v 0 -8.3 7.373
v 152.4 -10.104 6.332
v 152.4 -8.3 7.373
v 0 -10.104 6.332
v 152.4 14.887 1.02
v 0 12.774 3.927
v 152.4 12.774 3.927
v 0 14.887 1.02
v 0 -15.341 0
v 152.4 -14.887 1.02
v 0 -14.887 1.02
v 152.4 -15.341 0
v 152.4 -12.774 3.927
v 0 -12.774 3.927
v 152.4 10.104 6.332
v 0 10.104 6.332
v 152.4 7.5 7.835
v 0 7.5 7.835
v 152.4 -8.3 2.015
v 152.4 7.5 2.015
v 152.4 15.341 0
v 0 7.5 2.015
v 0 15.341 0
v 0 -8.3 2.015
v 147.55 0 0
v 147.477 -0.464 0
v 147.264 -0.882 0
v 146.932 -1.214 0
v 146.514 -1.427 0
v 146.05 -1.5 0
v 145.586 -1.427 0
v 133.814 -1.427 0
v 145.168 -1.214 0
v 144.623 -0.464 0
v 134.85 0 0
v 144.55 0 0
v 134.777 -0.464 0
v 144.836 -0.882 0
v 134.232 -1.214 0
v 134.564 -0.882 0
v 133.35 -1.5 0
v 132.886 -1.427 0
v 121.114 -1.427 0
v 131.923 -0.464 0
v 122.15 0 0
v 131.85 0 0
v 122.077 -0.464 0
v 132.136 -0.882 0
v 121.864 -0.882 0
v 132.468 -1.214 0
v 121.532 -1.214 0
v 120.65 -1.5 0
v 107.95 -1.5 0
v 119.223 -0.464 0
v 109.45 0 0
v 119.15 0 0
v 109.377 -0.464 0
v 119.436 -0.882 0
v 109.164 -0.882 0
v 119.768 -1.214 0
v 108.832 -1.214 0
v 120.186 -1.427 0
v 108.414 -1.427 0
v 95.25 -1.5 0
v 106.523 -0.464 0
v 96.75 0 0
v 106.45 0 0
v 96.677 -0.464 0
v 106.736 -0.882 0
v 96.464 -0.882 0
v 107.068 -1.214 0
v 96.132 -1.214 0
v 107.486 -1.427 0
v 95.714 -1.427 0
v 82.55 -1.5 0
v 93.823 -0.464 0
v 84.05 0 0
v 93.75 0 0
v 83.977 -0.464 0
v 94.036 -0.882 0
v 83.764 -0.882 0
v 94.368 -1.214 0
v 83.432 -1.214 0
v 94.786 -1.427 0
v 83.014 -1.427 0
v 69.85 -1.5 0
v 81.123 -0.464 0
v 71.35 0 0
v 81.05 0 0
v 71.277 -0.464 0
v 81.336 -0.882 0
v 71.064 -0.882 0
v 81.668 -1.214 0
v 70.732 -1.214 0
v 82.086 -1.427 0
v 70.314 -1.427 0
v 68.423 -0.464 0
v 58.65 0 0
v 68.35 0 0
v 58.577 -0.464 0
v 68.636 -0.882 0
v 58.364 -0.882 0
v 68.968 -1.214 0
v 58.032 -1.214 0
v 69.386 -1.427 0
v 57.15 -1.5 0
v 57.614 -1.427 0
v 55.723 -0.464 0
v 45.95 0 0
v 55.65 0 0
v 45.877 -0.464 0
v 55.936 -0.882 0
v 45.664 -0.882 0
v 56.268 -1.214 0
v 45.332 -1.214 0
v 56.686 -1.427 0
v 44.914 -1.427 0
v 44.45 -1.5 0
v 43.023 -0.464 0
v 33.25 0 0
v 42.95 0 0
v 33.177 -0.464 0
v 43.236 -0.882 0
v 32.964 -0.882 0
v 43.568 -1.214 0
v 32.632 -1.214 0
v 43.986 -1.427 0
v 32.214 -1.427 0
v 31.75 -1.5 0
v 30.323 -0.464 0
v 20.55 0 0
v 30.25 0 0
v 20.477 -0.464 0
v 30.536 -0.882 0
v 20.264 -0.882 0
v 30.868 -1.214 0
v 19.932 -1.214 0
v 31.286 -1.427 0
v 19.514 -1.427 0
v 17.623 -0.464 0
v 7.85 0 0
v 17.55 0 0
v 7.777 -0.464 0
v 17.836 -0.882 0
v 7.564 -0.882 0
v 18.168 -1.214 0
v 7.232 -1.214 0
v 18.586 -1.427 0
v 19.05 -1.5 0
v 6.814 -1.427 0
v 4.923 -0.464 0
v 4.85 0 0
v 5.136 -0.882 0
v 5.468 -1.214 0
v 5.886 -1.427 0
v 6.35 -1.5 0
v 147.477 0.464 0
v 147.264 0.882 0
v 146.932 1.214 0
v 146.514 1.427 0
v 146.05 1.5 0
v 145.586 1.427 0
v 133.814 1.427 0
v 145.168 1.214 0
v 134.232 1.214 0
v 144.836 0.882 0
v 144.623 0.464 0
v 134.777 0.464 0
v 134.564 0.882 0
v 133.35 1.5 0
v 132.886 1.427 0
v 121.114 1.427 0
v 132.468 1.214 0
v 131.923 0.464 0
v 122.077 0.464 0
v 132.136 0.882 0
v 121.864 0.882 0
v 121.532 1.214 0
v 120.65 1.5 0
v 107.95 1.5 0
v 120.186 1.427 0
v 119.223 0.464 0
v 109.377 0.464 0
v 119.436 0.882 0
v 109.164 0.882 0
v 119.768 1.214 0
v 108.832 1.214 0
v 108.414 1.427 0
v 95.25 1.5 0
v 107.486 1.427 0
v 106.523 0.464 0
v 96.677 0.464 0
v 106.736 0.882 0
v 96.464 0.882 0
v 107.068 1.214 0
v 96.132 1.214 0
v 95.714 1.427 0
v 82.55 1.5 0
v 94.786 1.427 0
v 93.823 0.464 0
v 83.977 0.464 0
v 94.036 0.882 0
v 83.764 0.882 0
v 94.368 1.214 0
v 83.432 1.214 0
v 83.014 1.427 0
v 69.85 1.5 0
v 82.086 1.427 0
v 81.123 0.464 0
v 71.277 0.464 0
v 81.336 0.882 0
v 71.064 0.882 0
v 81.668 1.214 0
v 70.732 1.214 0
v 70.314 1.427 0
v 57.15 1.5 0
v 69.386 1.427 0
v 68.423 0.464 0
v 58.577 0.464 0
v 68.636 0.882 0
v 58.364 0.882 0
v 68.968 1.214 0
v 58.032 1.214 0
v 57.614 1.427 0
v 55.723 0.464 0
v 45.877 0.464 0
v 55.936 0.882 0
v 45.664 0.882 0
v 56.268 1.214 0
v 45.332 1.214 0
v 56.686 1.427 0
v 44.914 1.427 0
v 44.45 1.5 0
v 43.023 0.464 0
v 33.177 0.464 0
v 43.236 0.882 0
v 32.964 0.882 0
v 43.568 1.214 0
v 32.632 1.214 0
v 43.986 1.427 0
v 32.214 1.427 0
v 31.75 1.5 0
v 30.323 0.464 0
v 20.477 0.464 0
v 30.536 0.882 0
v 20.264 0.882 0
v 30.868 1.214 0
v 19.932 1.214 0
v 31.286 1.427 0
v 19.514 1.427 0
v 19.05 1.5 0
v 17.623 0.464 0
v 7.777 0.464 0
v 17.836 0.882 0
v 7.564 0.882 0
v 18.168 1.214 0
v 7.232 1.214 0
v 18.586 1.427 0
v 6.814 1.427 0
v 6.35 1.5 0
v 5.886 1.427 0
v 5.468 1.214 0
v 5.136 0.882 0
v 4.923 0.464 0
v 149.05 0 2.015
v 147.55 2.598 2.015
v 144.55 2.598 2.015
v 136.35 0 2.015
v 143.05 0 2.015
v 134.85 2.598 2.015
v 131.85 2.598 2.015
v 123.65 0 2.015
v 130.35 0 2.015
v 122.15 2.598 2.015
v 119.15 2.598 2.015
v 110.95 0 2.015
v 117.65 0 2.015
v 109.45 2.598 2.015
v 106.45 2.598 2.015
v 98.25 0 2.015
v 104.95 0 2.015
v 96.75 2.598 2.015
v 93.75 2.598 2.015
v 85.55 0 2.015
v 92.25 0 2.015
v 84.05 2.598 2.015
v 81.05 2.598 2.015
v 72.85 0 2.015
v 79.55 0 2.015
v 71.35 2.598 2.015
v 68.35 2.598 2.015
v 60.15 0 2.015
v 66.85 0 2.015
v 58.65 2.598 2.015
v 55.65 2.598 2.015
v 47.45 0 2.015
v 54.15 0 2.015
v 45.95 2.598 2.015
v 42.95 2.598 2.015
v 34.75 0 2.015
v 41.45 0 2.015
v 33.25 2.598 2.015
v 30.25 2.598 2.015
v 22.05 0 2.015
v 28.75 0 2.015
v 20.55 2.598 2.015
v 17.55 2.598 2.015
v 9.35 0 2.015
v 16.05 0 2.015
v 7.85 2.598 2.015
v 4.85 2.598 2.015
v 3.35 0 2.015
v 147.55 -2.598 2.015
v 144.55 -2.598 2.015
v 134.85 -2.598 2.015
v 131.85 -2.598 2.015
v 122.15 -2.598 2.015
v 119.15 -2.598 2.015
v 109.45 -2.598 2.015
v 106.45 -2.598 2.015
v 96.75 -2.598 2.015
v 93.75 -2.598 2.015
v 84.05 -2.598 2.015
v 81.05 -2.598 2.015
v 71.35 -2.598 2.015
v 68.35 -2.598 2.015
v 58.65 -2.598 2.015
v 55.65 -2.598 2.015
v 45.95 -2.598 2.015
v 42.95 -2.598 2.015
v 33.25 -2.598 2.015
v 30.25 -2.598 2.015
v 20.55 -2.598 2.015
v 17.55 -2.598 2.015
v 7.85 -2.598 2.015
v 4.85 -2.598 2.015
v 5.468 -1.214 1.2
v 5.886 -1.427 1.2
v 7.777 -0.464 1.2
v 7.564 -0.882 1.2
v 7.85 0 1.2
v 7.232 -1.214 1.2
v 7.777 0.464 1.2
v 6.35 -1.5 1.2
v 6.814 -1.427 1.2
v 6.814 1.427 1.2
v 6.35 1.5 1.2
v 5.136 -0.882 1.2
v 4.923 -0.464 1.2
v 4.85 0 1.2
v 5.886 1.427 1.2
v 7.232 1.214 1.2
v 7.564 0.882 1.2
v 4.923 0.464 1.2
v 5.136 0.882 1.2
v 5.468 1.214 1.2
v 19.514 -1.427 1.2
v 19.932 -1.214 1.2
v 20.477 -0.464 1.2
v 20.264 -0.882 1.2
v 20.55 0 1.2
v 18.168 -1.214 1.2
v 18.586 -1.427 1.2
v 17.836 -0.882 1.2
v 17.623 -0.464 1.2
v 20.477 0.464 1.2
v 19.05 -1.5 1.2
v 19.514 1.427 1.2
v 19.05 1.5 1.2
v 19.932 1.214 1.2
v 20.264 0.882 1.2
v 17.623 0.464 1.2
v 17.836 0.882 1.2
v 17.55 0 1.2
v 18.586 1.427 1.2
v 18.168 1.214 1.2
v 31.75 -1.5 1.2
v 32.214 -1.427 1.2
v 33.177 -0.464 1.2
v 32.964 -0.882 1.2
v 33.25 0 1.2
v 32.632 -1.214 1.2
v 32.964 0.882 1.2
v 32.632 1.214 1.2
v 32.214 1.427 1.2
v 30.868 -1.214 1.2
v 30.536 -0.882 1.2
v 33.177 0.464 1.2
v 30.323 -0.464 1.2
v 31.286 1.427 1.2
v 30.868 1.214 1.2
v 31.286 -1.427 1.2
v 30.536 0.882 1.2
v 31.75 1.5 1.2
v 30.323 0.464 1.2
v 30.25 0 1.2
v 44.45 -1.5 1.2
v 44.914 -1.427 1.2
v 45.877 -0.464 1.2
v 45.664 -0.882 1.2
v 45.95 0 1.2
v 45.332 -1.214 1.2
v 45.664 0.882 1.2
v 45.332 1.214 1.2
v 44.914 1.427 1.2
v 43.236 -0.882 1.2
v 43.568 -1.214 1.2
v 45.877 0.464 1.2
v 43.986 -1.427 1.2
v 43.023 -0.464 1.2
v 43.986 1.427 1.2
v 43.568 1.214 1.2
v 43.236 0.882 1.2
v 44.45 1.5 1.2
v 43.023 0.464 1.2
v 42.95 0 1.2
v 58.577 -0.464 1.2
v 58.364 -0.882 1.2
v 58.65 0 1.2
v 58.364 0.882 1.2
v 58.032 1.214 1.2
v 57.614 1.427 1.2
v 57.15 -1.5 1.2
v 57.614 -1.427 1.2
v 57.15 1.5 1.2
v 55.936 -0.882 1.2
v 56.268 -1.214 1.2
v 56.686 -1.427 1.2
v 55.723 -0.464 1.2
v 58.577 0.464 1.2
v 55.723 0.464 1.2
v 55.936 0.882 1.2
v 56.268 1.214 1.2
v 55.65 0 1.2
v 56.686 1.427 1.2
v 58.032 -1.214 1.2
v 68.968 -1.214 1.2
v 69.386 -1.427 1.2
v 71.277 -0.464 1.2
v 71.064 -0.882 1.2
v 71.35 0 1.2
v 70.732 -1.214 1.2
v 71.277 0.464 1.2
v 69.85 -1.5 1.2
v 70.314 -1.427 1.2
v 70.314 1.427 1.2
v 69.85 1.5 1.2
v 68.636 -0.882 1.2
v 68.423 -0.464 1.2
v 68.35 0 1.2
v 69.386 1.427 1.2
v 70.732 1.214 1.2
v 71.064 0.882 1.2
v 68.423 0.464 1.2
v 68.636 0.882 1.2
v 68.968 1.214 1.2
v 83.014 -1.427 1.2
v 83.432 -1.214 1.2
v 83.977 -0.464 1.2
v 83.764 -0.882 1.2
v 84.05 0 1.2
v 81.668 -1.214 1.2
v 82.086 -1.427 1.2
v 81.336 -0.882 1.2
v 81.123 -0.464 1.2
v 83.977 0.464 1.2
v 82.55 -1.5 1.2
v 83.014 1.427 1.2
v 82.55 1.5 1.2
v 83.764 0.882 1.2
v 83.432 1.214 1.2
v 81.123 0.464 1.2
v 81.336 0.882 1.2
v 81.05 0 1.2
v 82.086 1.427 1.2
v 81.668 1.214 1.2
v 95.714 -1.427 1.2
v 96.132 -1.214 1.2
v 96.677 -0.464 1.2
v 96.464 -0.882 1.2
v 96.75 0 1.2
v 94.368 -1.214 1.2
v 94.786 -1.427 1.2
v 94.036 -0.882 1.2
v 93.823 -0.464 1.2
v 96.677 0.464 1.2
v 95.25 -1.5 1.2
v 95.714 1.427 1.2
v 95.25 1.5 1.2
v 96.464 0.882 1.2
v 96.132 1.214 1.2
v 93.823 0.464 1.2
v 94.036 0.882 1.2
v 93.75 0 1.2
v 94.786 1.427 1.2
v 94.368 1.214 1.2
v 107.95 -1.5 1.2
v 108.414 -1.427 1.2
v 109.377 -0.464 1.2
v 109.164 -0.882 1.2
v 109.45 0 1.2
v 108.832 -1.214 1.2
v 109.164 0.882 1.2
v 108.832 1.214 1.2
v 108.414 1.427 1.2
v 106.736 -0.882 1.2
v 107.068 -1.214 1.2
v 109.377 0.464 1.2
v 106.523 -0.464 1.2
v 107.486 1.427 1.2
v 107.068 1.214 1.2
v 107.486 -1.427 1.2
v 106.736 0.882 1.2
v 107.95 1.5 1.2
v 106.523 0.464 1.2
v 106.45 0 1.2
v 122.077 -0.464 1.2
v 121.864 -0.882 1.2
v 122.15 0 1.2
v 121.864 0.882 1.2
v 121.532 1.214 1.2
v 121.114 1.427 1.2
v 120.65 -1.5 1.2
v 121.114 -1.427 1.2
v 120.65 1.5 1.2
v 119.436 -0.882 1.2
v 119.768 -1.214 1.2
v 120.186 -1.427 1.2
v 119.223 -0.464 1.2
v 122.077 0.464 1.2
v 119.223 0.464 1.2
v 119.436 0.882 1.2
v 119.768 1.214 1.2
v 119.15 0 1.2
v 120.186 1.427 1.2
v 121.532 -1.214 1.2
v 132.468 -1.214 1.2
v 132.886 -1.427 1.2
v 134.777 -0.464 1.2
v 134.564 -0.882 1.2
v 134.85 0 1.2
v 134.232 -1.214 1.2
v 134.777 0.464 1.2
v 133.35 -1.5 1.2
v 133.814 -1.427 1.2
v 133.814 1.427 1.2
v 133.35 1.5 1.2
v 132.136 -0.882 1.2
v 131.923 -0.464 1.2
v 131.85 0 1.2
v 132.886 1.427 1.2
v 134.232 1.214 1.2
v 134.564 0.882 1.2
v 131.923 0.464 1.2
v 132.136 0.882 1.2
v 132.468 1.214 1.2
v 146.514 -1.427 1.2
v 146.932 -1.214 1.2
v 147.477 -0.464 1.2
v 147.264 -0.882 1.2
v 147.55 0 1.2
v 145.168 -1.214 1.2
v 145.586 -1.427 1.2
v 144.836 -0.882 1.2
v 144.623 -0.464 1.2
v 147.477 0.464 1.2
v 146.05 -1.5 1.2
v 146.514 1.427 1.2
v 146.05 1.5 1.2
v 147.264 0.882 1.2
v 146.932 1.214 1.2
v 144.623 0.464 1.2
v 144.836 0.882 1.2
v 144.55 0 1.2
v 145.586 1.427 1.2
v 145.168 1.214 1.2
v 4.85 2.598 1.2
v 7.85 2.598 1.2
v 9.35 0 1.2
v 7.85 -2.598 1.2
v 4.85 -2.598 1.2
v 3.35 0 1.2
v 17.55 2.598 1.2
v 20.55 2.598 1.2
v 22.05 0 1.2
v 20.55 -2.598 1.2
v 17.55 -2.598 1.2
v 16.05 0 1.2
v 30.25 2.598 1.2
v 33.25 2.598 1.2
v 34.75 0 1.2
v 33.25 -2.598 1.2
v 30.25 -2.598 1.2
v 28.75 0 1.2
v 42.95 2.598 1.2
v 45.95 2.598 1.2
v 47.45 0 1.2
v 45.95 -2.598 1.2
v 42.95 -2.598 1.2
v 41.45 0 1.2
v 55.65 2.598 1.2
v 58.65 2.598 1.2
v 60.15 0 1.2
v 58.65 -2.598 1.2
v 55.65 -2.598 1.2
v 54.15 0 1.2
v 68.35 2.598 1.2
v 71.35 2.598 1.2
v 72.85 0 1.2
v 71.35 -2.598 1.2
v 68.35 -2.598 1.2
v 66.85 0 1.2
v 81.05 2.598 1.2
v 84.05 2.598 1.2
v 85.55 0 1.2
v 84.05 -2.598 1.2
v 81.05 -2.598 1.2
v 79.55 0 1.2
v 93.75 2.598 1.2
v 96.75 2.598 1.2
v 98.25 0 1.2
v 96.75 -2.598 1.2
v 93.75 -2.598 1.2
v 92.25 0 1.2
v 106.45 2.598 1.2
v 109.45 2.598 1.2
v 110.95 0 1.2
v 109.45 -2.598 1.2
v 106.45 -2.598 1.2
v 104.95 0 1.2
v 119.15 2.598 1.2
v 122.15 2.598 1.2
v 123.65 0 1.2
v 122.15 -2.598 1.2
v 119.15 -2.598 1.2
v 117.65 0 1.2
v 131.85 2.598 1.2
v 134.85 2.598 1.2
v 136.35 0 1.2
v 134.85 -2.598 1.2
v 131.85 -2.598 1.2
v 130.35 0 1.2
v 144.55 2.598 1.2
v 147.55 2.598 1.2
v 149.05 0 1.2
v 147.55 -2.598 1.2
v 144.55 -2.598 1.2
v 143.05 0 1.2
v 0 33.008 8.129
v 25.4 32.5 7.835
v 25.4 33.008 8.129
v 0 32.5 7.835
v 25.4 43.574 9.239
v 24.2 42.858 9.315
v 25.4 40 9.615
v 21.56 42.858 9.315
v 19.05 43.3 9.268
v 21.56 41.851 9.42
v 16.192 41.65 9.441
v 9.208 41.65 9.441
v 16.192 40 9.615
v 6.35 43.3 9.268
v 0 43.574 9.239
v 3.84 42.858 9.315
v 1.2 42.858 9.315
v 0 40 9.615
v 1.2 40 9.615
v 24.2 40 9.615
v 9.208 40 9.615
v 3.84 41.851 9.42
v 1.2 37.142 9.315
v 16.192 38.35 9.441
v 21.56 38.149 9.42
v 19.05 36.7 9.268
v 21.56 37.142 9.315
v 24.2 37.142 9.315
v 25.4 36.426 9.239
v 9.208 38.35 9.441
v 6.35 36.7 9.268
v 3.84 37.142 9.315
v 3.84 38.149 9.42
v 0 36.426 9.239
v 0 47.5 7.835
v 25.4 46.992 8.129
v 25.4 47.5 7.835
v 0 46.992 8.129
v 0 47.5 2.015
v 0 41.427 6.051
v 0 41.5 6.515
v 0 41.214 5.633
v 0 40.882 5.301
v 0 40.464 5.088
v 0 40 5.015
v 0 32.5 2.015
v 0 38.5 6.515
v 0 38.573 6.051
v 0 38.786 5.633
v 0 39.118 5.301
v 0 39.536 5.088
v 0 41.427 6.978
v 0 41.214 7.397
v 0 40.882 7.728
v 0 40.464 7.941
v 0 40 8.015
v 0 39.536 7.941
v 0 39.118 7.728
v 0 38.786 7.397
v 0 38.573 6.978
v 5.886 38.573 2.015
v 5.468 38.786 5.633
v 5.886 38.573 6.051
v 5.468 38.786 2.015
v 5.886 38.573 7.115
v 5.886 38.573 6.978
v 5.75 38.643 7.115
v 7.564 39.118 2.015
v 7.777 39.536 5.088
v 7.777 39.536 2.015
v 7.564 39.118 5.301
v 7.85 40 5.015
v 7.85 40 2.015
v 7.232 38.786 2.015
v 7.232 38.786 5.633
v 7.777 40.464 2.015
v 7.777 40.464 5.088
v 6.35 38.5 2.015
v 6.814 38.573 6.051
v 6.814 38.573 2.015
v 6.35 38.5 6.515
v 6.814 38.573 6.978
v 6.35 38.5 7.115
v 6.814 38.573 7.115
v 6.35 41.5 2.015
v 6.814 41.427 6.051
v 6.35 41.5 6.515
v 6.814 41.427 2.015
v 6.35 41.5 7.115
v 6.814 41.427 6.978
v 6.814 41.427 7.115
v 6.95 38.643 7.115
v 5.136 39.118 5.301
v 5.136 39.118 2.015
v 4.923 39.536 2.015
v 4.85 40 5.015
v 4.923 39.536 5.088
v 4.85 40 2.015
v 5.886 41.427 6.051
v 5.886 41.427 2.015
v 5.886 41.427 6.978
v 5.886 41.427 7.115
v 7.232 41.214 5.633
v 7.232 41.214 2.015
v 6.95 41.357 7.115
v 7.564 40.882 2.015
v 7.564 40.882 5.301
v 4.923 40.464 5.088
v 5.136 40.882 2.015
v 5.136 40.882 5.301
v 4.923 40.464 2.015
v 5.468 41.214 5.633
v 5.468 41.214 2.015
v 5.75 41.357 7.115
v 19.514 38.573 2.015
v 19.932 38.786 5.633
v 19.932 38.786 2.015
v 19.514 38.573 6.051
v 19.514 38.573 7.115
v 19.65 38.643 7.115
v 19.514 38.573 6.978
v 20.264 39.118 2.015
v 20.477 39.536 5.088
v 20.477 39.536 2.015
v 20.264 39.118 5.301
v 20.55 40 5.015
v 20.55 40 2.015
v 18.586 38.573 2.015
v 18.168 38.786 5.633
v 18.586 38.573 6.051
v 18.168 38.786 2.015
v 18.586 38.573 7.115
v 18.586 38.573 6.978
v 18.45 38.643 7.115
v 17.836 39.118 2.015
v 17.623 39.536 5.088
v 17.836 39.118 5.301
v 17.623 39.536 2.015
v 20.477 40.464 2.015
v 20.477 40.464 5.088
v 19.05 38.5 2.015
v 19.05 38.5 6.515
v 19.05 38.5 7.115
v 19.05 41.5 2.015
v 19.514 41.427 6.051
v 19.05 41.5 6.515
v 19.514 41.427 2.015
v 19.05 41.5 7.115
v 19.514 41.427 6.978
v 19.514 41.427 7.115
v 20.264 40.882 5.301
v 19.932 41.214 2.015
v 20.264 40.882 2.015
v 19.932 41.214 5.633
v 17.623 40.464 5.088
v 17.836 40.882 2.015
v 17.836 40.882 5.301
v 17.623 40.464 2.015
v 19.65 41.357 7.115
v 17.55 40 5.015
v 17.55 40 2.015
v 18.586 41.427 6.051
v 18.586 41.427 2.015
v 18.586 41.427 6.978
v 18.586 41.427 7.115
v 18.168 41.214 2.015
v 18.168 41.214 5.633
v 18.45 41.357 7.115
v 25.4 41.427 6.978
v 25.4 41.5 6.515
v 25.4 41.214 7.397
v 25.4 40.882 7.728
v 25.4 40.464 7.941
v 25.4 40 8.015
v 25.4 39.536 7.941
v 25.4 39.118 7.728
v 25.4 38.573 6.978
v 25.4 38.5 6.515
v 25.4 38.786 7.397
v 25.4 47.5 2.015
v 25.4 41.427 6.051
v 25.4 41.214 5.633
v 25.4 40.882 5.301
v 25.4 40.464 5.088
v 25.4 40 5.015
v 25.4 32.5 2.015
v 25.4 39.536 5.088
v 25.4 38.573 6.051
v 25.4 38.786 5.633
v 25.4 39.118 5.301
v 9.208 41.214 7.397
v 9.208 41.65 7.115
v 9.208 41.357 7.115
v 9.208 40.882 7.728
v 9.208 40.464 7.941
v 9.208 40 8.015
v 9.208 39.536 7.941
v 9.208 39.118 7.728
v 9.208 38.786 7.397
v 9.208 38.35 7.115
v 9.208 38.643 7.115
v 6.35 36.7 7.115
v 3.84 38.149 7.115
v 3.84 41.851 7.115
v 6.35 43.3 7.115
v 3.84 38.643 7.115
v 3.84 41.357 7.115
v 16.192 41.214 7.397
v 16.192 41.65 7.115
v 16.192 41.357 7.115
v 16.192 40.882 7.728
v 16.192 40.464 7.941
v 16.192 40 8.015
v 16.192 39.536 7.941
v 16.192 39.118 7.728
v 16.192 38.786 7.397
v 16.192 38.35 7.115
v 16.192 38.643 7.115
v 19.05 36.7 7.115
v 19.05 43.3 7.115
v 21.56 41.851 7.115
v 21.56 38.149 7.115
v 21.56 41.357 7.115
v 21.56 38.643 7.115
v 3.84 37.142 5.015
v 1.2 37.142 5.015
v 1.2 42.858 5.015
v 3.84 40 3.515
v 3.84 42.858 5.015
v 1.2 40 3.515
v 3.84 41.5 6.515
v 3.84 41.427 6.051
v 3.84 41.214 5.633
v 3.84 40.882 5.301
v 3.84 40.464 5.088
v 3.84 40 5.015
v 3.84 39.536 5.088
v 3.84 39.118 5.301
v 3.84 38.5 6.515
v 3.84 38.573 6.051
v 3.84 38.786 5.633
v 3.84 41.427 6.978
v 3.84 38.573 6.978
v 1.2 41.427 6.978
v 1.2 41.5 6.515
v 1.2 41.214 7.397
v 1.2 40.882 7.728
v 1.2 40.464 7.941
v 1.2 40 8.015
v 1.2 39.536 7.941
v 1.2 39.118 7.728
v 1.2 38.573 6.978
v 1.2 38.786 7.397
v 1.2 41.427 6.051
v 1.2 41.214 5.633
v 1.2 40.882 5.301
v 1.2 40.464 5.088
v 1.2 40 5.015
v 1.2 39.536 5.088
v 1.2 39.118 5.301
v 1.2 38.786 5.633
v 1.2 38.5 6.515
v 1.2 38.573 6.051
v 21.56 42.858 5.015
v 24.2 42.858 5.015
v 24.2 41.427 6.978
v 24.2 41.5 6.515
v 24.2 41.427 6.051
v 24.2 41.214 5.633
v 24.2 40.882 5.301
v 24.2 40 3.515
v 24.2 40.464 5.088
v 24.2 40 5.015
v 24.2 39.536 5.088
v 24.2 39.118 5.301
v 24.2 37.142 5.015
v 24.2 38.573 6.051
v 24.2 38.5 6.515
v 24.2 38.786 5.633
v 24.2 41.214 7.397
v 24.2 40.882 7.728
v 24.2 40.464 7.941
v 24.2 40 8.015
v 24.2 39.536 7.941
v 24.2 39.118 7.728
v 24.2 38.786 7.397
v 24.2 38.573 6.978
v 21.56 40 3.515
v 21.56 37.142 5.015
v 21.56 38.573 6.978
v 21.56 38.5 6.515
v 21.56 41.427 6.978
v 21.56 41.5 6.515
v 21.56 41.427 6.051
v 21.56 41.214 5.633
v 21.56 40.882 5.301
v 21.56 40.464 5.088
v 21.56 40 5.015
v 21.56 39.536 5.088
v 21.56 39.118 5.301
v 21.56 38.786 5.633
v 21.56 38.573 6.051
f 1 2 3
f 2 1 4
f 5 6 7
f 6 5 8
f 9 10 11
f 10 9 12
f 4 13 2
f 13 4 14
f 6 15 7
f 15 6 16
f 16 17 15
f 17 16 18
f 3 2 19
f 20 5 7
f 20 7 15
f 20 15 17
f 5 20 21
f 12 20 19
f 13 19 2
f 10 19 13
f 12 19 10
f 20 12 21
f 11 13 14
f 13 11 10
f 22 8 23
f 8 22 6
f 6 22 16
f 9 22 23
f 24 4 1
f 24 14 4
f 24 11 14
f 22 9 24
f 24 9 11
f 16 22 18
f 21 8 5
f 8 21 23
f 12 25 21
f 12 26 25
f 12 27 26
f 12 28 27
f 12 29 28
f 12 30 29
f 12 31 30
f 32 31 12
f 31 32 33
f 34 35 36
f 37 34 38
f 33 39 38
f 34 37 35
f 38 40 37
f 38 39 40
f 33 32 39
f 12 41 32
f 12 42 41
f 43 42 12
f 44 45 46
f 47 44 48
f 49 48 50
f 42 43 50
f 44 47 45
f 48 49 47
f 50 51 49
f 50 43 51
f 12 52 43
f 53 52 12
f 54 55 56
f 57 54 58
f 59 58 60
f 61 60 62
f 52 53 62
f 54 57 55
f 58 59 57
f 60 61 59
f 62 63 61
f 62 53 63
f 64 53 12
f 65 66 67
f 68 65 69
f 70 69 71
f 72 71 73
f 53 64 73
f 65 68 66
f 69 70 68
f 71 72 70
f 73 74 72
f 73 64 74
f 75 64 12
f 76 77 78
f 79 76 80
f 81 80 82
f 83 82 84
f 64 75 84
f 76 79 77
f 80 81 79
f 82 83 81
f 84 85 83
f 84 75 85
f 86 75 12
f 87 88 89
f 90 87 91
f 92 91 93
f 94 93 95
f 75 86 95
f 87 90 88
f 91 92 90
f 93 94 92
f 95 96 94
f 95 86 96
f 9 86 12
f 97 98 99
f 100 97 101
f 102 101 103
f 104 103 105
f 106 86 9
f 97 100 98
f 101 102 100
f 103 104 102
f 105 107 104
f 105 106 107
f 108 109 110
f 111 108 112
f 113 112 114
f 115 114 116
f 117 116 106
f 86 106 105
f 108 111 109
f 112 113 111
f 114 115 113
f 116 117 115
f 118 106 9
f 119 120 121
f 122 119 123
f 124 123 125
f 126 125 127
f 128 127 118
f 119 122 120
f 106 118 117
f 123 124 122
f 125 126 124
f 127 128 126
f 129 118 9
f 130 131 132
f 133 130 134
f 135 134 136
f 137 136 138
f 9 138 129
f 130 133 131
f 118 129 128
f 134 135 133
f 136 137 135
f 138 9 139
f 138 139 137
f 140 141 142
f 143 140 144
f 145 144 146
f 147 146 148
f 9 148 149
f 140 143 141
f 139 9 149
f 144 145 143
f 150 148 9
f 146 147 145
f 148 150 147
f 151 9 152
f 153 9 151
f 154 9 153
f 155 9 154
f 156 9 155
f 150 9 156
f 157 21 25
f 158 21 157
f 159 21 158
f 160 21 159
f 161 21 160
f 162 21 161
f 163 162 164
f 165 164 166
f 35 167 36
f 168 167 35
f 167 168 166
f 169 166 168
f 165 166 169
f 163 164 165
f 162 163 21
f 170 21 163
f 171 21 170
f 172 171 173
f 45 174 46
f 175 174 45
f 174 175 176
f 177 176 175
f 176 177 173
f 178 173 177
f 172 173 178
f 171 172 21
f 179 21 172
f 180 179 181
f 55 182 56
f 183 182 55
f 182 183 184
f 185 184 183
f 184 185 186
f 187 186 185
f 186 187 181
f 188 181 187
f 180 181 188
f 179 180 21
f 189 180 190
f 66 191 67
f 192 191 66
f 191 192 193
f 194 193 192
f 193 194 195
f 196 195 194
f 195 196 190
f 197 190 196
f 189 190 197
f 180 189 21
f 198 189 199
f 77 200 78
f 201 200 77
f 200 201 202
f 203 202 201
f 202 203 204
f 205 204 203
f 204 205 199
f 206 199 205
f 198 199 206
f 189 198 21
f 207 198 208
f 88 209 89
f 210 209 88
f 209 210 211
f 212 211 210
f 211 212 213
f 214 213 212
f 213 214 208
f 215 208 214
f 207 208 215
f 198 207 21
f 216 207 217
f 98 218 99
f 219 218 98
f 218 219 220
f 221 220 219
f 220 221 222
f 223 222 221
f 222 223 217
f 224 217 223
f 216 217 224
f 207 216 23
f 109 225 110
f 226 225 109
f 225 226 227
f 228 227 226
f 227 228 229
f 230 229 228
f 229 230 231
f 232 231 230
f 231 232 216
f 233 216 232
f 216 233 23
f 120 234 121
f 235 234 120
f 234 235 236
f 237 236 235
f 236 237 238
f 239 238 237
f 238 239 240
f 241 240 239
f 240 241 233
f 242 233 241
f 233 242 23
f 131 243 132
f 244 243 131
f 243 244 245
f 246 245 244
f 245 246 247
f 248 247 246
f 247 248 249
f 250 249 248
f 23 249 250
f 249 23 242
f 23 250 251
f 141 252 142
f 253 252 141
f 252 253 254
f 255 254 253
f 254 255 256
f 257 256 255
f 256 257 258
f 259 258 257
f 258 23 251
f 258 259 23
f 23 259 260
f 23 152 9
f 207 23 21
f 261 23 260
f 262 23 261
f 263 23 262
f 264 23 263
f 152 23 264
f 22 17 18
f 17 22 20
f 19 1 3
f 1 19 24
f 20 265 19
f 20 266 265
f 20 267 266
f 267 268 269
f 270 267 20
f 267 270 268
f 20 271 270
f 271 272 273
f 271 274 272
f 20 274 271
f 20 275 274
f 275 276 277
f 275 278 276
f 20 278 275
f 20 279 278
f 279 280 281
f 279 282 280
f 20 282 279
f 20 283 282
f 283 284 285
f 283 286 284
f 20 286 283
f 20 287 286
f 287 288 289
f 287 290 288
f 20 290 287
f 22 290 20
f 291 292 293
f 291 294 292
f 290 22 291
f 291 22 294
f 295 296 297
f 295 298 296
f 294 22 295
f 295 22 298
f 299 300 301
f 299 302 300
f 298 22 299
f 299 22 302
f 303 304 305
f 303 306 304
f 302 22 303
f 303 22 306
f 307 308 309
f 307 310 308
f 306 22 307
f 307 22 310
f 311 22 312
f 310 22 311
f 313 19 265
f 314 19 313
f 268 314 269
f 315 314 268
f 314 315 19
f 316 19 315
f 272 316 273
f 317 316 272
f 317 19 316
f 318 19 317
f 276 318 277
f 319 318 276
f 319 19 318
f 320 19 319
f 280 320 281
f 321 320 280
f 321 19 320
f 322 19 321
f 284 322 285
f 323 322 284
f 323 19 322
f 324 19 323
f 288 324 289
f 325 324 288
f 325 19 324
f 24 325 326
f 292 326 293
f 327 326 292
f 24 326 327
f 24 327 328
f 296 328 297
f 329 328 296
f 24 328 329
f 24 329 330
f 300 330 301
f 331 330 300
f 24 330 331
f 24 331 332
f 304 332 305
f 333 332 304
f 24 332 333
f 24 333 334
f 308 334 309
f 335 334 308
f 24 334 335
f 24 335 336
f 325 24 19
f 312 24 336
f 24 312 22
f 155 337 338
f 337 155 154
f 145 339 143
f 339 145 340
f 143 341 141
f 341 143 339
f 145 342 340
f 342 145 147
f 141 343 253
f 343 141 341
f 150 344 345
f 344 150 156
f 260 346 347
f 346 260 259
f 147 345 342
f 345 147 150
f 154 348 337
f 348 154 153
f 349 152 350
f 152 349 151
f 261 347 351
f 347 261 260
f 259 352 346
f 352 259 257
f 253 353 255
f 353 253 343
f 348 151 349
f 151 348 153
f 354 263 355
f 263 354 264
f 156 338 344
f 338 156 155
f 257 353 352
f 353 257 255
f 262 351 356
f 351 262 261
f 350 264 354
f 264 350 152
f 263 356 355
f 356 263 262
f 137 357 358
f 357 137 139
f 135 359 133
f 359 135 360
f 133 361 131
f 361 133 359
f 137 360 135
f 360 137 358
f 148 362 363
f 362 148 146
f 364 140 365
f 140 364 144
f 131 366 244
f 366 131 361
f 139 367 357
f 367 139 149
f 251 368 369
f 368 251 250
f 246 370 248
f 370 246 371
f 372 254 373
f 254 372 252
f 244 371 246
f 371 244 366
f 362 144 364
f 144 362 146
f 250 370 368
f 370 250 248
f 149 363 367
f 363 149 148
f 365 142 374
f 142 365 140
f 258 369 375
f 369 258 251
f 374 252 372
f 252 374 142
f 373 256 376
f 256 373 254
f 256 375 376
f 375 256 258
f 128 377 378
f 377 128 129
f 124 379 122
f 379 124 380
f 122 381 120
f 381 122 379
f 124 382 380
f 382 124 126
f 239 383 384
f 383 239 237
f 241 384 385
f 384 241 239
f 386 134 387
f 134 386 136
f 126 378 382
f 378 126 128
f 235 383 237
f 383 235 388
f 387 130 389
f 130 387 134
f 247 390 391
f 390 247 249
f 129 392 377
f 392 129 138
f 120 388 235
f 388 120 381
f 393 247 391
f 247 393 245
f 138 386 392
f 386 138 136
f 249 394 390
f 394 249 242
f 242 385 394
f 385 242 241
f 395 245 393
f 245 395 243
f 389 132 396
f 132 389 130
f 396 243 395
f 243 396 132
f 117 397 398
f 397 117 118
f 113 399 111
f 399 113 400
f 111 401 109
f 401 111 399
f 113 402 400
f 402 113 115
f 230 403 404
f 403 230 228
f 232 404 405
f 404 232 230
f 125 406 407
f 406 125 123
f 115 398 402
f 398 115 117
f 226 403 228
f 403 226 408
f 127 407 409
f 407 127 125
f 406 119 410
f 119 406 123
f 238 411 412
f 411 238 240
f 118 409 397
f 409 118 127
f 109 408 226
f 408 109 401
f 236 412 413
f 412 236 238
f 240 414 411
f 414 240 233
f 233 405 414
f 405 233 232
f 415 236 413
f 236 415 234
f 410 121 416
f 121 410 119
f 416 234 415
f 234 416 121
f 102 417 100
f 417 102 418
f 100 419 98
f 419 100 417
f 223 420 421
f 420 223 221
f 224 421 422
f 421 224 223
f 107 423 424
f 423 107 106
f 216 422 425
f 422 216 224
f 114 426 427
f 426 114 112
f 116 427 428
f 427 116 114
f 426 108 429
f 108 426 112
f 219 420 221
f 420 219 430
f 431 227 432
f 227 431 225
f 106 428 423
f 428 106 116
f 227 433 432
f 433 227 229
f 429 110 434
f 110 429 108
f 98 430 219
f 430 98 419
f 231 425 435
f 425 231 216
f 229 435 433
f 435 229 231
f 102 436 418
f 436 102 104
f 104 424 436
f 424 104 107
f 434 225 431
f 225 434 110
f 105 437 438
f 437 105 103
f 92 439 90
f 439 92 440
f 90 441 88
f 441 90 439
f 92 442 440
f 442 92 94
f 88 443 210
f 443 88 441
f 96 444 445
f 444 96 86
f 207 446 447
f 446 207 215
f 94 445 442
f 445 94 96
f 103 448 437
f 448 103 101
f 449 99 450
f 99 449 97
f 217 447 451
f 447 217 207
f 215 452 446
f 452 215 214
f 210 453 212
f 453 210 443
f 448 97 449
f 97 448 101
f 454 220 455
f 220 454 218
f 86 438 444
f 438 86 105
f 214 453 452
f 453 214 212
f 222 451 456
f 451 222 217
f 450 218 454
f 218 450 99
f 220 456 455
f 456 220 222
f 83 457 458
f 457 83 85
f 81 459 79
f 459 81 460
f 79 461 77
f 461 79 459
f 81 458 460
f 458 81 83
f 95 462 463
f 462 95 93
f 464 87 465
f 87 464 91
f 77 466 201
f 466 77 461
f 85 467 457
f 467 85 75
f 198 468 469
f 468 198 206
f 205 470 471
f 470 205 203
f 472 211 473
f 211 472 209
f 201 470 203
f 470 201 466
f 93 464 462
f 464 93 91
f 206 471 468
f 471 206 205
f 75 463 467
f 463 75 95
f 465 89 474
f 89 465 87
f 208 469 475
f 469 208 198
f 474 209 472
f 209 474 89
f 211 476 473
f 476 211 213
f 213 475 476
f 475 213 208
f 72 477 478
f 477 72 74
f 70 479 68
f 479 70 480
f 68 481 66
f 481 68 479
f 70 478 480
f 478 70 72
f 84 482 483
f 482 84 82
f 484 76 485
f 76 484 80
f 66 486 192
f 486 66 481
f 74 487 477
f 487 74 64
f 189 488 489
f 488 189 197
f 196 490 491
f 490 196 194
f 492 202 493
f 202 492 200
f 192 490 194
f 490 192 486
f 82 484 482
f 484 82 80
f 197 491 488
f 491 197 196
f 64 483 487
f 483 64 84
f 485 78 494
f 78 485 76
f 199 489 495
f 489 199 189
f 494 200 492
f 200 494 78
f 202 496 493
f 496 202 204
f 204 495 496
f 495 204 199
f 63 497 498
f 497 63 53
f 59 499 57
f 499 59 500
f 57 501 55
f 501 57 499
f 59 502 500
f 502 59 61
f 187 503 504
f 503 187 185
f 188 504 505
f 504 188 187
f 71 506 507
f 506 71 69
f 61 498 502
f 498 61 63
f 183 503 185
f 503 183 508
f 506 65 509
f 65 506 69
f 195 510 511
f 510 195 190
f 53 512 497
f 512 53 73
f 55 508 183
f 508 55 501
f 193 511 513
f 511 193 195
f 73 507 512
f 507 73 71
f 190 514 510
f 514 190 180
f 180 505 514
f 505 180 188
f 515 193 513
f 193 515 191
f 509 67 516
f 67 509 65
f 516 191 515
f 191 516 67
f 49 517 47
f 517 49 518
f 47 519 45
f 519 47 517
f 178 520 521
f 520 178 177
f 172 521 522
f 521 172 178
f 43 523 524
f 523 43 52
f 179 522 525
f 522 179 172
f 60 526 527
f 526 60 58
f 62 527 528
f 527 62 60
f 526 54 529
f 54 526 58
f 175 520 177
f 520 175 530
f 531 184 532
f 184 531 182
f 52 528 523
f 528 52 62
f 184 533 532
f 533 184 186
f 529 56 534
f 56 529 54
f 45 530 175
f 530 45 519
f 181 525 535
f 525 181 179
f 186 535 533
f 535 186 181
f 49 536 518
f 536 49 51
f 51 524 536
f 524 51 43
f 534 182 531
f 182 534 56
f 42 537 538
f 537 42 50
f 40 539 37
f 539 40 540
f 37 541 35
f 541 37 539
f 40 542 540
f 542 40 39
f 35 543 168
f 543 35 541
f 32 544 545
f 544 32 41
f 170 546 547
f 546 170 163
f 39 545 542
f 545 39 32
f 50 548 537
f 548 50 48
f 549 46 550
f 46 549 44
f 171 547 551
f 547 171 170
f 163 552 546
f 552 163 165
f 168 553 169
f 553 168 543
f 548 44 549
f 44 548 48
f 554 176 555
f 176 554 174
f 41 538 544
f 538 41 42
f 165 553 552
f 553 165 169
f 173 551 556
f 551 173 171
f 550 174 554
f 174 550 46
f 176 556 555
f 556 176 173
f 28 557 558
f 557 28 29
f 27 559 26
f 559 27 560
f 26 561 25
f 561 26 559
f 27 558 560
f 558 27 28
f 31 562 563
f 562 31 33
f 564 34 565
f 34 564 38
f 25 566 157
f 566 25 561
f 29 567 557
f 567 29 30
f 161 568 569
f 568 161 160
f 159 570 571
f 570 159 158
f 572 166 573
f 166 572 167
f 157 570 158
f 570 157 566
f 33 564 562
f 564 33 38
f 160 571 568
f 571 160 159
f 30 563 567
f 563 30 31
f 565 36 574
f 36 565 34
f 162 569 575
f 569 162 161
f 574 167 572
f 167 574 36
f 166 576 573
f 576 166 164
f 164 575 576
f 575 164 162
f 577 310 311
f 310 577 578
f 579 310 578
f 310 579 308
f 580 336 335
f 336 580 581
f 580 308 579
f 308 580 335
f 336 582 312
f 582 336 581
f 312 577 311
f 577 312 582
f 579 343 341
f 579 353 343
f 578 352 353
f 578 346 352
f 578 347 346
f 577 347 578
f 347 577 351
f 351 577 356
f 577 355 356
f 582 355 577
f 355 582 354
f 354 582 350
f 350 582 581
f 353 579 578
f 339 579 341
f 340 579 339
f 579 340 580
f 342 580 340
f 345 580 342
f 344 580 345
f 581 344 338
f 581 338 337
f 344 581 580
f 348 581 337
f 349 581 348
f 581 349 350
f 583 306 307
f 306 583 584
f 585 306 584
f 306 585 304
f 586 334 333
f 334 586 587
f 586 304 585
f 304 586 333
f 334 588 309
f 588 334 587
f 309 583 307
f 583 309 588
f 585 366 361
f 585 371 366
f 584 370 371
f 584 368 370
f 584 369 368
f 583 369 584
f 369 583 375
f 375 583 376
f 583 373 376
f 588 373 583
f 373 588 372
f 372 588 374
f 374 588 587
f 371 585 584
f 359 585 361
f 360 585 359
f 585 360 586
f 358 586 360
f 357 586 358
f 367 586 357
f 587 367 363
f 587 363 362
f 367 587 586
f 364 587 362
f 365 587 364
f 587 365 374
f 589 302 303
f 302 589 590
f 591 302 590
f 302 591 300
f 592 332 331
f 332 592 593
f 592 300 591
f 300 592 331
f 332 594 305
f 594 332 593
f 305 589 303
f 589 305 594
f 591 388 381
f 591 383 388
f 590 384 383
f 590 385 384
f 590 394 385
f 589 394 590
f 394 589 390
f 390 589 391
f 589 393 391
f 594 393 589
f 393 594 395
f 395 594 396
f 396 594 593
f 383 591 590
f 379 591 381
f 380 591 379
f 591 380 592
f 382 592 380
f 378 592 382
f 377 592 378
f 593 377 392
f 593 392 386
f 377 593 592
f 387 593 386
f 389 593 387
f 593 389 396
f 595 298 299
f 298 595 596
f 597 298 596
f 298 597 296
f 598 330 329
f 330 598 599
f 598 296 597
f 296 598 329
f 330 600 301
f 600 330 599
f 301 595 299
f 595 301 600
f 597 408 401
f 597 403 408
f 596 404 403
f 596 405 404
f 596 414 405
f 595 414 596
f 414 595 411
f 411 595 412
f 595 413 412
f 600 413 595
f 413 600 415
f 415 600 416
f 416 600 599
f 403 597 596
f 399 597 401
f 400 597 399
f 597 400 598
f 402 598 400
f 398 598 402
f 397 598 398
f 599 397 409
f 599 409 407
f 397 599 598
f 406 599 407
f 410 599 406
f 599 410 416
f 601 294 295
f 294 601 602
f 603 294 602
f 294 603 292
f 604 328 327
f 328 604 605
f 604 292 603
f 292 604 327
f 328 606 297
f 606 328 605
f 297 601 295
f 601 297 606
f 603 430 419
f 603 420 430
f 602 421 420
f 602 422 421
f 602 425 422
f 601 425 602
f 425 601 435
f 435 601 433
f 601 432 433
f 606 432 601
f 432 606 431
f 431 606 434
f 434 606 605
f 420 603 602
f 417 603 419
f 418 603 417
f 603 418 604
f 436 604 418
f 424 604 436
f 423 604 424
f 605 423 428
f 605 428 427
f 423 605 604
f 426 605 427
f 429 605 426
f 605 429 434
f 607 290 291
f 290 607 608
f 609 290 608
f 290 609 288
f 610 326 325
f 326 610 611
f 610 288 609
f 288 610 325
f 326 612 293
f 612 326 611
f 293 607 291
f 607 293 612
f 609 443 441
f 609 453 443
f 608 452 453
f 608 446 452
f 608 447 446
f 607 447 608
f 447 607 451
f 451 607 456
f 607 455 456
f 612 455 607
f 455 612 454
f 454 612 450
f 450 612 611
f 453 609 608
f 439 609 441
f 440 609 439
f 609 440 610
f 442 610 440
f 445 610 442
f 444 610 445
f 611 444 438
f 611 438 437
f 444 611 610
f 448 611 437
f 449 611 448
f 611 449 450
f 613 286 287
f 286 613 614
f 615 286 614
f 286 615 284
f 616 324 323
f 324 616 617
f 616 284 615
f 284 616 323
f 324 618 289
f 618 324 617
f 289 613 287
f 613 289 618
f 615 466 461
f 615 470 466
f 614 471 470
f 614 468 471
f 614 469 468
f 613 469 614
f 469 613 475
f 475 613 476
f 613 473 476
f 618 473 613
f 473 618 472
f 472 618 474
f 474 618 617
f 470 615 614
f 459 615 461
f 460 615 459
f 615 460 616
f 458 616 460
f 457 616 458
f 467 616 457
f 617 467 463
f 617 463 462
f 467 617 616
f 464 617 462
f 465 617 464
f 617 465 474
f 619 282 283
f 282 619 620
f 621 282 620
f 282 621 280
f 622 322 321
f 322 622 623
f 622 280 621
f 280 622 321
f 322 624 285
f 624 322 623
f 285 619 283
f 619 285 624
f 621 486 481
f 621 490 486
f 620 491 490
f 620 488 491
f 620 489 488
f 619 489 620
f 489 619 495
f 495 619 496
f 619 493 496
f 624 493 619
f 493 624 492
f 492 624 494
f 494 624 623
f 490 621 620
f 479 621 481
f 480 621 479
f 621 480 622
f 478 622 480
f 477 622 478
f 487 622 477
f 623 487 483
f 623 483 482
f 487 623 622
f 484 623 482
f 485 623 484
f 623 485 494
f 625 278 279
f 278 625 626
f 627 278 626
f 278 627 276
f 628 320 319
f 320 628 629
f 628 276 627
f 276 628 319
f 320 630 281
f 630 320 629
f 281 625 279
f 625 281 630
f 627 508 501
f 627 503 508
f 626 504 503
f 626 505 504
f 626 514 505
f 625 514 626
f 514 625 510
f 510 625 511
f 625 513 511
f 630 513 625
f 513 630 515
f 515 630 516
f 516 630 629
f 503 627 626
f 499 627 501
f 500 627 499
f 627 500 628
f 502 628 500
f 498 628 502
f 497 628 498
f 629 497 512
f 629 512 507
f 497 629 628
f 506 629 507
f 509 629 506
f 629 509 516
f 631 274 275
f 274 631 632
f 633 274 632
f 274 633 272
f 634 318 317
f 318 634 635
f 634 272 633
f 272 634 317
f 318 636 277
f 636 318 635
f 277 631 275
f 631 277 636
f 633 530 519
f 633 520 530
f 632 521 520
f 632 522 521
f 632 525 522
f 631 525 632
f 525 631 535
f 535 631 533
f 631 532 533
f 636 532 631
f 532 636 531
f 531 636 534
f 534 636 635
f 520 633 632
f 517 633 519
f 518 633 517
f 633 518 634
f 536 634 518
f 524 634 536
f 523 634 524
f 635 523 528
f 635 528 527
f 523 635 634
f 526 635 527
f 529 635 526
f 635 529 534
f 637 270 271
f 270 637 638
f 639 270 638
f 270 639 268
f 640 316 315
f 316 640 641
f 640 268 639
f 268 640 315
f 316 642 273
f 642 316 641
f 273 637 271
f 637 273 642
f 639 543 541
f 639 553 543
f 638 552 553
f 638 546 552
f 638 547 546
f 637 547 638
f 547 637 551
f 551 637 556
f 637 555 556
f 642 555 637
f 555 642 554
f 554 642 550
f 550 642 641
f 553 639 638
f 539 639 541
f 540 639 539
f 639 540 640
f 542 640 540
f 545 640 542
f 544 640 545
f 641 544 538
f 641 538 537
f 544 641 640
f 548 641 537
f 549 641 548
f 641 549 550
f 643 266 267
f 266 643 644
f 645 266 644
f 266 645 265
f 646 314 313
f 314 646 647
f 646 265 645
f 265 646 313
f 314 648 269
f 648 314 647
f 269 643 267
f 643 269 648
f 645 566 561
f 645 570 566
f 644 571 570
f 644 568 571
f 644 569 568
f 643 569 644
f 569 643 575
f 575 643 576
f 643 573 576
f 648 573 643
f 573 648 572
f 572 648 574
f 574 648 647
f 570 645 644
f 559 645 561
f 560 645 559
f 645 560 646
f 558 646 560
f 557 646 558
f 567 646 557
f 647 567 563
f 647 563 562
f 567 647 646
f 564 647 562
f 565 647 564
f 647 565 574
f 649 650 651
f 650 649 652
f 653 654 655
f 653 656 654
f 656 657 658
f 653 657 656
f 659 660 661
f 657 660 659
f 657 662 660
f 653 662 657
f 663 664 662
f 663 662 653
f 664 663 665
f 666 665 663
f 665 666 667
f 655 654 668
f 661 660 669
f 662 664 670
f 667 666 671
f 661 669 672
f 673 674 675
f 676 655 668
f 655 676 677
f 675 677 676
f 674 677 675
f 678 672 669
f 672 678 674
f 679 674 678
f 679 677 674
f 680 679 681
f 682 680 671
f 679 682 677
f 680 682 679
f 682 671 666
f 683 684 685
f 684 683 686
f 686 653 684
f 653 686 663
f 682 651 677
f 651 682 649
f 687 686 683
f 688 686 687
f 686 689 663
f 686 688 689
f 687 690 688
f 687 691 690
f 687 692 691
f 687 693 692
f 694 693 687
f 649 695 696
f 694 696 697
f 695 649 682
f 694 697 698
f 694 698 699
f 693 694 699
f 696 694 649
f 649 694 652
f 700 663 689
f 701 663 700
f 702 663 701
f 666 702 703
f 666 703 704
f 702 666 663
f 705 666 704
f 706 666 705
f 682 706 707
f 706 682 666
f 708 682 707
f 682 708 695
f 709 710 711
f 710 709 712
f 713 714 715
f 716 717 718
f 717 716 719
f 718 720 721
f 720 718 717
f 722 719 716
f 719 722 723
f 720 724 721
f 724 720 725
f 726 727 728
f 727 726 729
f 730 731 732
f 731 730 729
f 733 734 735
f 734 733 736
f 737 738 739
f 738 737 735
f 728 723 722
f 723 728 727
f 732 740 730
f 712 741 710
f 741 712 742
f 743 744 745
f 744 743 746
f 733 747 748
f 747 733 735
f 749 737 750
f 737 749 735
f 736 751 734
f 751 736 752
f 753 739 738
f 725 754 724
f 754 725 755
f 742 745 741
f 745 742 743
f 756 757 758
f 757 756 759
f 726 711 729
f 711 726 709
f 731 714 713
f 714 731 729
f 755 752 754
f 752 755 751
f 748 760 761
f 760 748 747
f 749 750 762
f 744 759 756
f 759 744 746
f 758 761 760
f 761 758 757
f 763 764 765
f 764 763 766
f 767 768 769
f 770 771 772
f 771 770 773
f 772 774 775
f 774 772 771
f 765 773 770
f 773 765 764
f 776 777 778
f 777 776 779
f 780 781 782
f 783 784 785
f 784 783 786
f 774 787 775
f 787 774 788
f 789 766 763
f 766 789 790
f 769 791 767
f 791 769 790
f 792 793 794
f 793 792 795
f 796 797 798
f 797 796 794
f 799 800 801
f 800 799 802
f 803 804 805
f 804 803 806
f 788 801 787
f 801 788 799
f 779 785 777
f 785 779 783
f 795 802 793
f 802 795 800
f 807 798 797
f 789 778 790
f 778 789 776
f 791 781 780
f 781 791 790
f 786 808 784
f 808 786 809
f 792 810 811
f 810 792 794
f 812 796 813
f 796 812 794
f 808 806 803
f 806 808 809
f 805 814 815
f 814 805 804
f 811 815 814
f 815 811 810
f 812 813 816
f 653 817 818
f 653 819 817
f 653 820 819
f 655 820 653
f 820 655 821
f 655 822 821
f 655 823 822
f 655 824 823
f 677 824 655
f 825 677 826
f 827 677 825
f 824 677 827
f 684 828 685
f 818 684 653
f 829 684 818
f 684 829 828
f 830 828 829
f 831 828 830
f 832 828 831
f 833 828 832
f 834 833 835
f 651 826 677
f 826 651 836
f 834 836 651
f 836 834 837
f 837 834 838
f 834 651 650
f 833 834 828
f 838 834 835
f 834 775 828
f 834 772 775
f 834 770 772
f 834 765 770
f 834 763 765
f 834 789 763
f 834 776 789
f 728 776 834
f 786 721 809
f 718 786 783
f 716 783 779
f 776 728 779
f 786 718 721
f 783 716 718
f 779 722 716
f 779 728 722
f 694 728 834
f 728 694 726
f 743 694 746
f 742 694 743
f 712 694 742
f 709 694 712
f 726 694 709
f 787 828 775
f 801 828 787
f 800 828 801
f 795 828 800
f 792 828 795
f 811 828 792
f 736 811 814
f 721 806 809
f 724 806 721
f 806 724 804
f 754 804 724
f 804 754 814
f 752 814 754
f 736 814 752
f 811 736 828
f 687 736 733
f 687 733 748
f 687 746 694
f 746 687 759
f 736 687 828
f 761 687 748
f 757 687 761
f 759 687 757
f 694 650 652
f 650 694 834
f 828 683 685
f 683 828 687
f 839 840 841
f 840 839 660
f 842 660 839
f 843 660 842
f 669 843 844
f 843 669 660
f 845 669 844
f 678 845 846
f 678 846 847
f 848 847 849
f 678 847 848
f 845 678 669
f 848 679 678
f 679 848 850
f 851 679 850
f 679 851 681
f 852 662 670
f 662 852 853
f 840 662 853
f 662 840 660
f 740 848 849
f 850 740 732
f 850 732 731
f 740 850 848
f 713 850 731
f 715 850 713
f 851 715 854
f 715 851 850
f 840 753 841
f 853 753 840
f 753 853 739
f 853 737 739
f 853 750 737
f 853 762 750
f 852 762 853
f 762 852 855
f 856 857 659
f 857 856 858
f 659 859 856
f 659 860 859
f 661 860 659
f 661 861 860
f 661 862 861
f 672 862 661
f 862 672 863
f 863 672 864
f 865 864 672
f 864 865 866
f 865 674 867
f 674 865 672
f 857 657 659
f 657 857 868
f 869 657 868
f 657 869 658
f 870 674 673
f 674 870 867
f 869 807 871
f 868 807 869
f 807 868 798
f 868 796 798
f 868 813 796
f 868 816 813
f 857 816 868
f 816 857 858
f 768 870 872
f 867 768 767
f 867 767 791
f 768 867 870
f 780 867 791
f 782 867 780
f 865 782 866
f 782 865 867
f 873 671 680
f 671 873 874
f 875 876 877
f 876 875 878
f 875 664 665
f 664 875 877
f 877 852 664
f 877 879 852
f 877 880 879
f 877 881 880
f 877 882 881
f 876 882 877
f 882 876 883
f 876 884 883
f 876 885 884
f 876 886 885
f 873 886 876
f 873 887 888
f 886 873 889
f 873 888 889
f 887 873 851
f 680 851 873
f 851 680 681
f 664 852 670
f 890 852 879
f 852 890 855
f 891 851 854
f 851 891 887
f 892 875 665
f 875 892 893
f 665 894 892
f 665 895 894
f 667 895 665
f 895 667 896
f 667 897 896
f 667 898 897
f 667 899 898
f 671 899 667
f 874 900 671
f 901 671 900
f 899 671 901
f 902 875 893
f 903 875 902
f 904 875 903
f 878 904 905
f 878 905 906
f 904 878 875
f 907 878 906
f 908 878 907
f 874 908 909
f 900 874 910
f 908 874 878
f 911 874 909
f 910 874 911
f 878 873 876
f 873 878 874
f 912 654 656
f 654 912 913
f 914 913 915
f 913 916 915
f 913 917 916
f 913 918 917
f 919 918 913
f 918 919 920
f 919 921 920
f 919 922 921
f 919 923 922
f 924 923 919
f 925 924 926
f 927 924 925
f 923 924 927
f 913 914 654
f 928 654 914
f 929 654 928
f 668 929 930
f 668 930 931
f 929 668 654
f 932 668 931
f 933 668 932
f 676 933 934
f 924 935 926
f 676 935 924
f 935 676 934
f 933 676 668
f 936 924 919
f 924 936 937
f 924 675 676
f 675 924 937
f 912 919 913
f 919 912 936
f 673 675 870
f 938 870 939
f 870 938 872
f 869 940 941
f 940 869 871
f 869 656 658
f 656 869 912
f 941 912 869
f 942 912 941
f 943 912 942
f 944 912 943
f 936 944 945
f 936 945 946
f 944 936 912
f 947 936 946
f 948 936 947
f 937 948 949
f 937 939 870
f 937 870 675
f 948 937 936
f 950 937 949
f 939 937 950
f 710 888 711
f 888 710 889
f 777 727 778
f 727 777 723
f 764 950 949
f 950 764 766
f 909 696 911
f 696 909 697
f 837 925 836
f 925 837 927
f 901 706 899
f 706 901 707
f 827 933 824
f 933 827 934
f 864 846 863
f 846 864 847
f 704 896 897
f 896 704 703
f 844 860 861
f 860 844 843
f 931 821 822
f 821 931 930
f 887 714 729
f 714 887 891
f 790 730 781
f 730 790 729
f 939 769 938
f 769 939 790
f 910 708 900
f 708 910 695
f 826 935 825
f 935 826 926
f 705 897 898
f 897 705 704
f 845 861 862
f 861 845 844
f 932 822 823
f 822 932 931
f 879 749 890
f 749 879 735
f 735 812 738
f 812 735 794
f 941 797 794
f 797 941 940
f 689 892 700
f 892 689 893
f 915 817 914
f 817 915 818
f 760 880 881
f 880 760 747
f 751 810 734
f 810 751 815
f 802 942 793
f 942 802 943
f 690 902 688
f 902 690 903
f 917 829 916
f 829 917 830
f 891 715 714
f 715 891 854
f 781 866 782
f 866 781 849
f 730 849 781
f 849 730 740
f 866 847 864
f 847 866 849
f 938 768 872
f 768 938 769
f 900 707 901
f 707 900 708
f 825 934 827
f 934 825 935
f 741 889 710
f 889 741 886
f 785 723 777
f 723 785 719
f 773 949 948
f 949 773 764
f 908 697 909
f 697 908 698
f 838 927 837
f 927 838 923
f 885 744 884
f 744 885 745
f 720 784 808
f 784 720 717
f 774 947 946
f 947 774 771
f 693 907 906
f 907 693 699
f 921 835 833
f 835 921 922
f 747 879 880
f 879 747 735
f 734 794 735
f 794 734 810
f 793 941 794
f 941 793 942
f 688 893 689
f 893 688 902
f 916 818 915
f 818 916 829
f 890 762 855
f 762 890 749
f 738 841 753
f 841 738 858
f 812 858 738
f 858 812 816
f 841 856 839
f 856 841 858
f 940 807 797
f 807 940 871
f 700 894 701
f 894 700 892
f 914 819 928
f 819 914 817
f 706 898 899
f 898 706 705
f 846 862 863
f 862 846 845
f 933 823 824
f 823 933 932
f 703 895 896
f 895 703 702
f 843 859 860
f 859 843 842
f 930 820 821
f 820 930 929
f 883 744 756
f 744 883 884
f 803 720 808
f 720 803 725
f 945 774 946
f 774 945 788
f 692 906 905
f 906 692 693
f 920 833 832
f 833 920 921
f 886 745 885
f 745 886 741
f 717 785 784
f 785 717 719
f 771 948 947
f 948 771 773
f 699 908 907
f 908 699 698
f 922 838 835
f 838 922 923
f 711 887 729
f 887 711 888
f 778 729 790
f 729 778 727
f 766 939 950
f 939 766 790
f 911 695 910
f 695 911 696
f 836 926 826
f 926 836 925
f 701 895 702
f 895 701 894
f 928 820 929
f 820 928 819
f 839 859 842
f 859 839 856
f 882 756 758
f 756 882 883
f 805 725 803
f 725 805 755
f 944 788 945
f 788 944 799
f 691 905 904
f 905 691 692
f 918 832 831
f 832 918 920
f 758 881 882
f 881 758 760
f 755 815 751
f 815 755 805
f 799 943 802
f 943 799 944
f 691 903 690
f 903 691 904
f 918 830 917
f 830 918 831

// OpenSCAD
// file: common.scad
// units are in mm in keeping with OpenSCAD STL export behavior
// multiplying a dimension in inches by the `inch` variable
// produces the equivalent dimension in mm
inch = 25.4;

thick = 0.6; // 3D printer layer height / line thickness. This should not be changed.

// ABS pipe standard dimensions for nominal 1.25 inch pipe
// diameters
pipe_OD = 1.660 * inch;
pipe_ID = 1.385 * inch;
// radii
pipe_OR = pipe_OD/2;
pipe_IR = pipe_ID/2;

// PCB dimensions and mounting hole spacing
PCBX = 6.400 * inch;
PCBY = 1.250 * inch;
PCBZ = 1.6; // thickness, confirm with PCB fab service
mount_hole_spacing = 0.500 * inch;
mount_hole_start = 0.250 * inch;

// to facilitate 3D printing the skeleton for a single T-Stick
// is broken into several parts, which I here refer to as "modules"
skeleton_module_length = 6 * inch;
skeleton_face_thickness = 3 * thick; // 1.8mm
connector_thickness = 3 * thick; // 1.8mm
connector_width = 15;
connector_length = skeleton_module_length*2/3;
// right angle triangle with base PCBY/2 and hypotenuse pipe_IR has height...
cylinder_top_cut_height_offset = sqrt(pipe_IR*pipe_IR - (PCBY/2)*(PCBY/2));
skeleton_module_total_thickness = pipe_IR - cylinder_top_cut_height_offset;

// hardware
// these should probably be oversized or parameterized
// to allow press fit vs loose fit
M3_hole_diameter = 3;
M3_hole_diameter_loose = 3.3;
M3_nut_height = 2.4;
M3_head_diameter = 7;
M3_head_height = 3;
M3_nut_circumcircle_diameter = 6;
heatshrink_thickness = 5/8;

module M3_nut_volume(rotation=0, scaling=1)
{
    scale([scaling, scaling, scaling]) rotate([0,0,rotation])
        cylinder(h = M3_nut_height, d = M3_nut_circumcircle_diameter, $fn=6);
}

module pipe_volume(radius, length=skeleton_module_length)
{
    translate([0,0,cylinder_top_cut_height_offset])
            rotate([0,90,0])
                cylinder(h = length, r = radius);
}

module pipe_ID_volume(length=skeleton_module_length)
{
    pipe_volume(pipe_IR, length);
}

module pipe_OD_volume(length=skeleton_module_length)
{
    pipe_volume(pipe_OR, length);
}

module pipe_top_area()
{
    translate([-500,-500,0])
        cube([1000,1000,1000]);
}

module skeleton_module_volume(length=skeleton_module_length)
{
    skeleton_fit_shrink = 0.4; // so that the skeleton fits flush inside the pipe
    difference()
    {
        pipe_volume(pipe_IR-skeleton_fit_shrink, length);
        pipe_top_area();
    }
}

module screw_holes(diameter=M3_hole_diameter)
{
    union()
    {
        for(x = [mount_hole_start : mount_hole_spacing : skeleton_module_length - 1])
        {
            translate([x, 0, -500])
                cylinder(h = 1000, d = diameter, $fn=20);
        }
    }
}

axial_screw_hole_offset = cylinder_top_cut_height_offset-pipe_ID/2+M3_head_diameter/2;
module axial_screw_hole(diameter=M3_hole_diameter, length=1000, center=true, xoffset=0)
{
    translate([xoffset,0,axial_screw_hole_offset])
        rotate([0,90,0])
            cylinder(length, r=diameter/2, $fn=20, center=center);
}

module top_axial()
{
    translate([0,0,cylinder_top_cut_height_offset])
        rotate([180,0,0])
            translate([0,0,-cylinder_top_cut_height_offset])
                children();
}
// main file
include <common.scad>

skeleton_connector_tolerance = 0.8;

module nuts(z, r=0, s=1)
{
    union()
    {
        for(x = [mount_hole_start : mount_hole_spacing : skeleton_module_length - 1])
        {
            translate([x, 0, z]) 
                M3_nut_volume(r,s);
        }
    }
}

module middle_nuts()
{
    nuts(-(M3_nut_height + skeleton_face_thickness - thick));
}

module connector_nuts()
{
    translate([0,0,-(skeleton_module_total_thickness-M3_nut_height-0.5)]) scale([1,1,1000]) mirror([0,0,1]) nuts(0,90,1.1);
}

module connector_axial_nut_slot()
{
    scale([1.1,1.1,1]) hull()
    {
        translate([0, 0, -(skeleton_module_total_thickness-M3_head_diameter/2)]) rotate([0,90,0]) M3_nut_volume();
        translate([0, 0, -1000]) rotate([0,90,0]) M3_nut_volume();
    }
}

module connector_axial_nut_slots(length)
{
    wall=2*thick;
    union()
    {
        translate([wall,0,0]) connector_axial_nut_slot();
        translate([length - wall,0,0]) mirror([1,0,0]) connector_axial_nut_slot();
    }
}

module bottom_holes()
{
    union()
    {
        mirror([0,0,1]) for(x = [mount_hole_start : mount_hole_spacing : skeleton_module_length - 1])
        {
            translate([ x-M3_nut_circumcircle_diameter/2
                      , -connector_width/2
                      , skeleton_face_thickness + connector_thickness])
                cube([M3_nut_circumcircle_diameter, connector_width, 1000]);
        }
    }
}

module connector_volume(length=skeleton_module_length/2)
{
    width = connector_width;
    thickness = M3_head_diameter+1;
    vertical_offset = -(skeleton_module_total_thickness);
    intersection()
    {
        translate([0,-width/2,vertical_offset]) cube([length, width, thickness]);
        skeleton_module_volume();
    }
}

module connector(length)
{
    difference()
    {
        connector_volume(length);
        screw_holes($fn=20);
        connector_nuts();
        connector_axial_nut_slots(length);
        axial_screw_hole();
    }    
}

module skeleton()
{
    tol = skeleton_connector_tolerance;
    difference()
    {
        skeleton_module_volume();
        translate([0,0,-tol]) connector_volume(skeleton_module_length);
        translate([tol,0,-tol]) connector_volume(skeleton_module_length);
        translate([0,tol,-tol]) connector_volume(skeleton_module_length);
        translate([0,0,0]) connector_volume(skeleton_module_length);
        translate([tol,0,0]) connector_volume(skeleton_module_length);
        translate([0,tol,0]) connector_volume(skeleton_module_length);
        screw_holes($fn=20);
        middle_nuts();
    }
}

rotate([180,0,0]) skeleton();
translate([0,40,0]) rotate([180,0,0]) connector(inch);
